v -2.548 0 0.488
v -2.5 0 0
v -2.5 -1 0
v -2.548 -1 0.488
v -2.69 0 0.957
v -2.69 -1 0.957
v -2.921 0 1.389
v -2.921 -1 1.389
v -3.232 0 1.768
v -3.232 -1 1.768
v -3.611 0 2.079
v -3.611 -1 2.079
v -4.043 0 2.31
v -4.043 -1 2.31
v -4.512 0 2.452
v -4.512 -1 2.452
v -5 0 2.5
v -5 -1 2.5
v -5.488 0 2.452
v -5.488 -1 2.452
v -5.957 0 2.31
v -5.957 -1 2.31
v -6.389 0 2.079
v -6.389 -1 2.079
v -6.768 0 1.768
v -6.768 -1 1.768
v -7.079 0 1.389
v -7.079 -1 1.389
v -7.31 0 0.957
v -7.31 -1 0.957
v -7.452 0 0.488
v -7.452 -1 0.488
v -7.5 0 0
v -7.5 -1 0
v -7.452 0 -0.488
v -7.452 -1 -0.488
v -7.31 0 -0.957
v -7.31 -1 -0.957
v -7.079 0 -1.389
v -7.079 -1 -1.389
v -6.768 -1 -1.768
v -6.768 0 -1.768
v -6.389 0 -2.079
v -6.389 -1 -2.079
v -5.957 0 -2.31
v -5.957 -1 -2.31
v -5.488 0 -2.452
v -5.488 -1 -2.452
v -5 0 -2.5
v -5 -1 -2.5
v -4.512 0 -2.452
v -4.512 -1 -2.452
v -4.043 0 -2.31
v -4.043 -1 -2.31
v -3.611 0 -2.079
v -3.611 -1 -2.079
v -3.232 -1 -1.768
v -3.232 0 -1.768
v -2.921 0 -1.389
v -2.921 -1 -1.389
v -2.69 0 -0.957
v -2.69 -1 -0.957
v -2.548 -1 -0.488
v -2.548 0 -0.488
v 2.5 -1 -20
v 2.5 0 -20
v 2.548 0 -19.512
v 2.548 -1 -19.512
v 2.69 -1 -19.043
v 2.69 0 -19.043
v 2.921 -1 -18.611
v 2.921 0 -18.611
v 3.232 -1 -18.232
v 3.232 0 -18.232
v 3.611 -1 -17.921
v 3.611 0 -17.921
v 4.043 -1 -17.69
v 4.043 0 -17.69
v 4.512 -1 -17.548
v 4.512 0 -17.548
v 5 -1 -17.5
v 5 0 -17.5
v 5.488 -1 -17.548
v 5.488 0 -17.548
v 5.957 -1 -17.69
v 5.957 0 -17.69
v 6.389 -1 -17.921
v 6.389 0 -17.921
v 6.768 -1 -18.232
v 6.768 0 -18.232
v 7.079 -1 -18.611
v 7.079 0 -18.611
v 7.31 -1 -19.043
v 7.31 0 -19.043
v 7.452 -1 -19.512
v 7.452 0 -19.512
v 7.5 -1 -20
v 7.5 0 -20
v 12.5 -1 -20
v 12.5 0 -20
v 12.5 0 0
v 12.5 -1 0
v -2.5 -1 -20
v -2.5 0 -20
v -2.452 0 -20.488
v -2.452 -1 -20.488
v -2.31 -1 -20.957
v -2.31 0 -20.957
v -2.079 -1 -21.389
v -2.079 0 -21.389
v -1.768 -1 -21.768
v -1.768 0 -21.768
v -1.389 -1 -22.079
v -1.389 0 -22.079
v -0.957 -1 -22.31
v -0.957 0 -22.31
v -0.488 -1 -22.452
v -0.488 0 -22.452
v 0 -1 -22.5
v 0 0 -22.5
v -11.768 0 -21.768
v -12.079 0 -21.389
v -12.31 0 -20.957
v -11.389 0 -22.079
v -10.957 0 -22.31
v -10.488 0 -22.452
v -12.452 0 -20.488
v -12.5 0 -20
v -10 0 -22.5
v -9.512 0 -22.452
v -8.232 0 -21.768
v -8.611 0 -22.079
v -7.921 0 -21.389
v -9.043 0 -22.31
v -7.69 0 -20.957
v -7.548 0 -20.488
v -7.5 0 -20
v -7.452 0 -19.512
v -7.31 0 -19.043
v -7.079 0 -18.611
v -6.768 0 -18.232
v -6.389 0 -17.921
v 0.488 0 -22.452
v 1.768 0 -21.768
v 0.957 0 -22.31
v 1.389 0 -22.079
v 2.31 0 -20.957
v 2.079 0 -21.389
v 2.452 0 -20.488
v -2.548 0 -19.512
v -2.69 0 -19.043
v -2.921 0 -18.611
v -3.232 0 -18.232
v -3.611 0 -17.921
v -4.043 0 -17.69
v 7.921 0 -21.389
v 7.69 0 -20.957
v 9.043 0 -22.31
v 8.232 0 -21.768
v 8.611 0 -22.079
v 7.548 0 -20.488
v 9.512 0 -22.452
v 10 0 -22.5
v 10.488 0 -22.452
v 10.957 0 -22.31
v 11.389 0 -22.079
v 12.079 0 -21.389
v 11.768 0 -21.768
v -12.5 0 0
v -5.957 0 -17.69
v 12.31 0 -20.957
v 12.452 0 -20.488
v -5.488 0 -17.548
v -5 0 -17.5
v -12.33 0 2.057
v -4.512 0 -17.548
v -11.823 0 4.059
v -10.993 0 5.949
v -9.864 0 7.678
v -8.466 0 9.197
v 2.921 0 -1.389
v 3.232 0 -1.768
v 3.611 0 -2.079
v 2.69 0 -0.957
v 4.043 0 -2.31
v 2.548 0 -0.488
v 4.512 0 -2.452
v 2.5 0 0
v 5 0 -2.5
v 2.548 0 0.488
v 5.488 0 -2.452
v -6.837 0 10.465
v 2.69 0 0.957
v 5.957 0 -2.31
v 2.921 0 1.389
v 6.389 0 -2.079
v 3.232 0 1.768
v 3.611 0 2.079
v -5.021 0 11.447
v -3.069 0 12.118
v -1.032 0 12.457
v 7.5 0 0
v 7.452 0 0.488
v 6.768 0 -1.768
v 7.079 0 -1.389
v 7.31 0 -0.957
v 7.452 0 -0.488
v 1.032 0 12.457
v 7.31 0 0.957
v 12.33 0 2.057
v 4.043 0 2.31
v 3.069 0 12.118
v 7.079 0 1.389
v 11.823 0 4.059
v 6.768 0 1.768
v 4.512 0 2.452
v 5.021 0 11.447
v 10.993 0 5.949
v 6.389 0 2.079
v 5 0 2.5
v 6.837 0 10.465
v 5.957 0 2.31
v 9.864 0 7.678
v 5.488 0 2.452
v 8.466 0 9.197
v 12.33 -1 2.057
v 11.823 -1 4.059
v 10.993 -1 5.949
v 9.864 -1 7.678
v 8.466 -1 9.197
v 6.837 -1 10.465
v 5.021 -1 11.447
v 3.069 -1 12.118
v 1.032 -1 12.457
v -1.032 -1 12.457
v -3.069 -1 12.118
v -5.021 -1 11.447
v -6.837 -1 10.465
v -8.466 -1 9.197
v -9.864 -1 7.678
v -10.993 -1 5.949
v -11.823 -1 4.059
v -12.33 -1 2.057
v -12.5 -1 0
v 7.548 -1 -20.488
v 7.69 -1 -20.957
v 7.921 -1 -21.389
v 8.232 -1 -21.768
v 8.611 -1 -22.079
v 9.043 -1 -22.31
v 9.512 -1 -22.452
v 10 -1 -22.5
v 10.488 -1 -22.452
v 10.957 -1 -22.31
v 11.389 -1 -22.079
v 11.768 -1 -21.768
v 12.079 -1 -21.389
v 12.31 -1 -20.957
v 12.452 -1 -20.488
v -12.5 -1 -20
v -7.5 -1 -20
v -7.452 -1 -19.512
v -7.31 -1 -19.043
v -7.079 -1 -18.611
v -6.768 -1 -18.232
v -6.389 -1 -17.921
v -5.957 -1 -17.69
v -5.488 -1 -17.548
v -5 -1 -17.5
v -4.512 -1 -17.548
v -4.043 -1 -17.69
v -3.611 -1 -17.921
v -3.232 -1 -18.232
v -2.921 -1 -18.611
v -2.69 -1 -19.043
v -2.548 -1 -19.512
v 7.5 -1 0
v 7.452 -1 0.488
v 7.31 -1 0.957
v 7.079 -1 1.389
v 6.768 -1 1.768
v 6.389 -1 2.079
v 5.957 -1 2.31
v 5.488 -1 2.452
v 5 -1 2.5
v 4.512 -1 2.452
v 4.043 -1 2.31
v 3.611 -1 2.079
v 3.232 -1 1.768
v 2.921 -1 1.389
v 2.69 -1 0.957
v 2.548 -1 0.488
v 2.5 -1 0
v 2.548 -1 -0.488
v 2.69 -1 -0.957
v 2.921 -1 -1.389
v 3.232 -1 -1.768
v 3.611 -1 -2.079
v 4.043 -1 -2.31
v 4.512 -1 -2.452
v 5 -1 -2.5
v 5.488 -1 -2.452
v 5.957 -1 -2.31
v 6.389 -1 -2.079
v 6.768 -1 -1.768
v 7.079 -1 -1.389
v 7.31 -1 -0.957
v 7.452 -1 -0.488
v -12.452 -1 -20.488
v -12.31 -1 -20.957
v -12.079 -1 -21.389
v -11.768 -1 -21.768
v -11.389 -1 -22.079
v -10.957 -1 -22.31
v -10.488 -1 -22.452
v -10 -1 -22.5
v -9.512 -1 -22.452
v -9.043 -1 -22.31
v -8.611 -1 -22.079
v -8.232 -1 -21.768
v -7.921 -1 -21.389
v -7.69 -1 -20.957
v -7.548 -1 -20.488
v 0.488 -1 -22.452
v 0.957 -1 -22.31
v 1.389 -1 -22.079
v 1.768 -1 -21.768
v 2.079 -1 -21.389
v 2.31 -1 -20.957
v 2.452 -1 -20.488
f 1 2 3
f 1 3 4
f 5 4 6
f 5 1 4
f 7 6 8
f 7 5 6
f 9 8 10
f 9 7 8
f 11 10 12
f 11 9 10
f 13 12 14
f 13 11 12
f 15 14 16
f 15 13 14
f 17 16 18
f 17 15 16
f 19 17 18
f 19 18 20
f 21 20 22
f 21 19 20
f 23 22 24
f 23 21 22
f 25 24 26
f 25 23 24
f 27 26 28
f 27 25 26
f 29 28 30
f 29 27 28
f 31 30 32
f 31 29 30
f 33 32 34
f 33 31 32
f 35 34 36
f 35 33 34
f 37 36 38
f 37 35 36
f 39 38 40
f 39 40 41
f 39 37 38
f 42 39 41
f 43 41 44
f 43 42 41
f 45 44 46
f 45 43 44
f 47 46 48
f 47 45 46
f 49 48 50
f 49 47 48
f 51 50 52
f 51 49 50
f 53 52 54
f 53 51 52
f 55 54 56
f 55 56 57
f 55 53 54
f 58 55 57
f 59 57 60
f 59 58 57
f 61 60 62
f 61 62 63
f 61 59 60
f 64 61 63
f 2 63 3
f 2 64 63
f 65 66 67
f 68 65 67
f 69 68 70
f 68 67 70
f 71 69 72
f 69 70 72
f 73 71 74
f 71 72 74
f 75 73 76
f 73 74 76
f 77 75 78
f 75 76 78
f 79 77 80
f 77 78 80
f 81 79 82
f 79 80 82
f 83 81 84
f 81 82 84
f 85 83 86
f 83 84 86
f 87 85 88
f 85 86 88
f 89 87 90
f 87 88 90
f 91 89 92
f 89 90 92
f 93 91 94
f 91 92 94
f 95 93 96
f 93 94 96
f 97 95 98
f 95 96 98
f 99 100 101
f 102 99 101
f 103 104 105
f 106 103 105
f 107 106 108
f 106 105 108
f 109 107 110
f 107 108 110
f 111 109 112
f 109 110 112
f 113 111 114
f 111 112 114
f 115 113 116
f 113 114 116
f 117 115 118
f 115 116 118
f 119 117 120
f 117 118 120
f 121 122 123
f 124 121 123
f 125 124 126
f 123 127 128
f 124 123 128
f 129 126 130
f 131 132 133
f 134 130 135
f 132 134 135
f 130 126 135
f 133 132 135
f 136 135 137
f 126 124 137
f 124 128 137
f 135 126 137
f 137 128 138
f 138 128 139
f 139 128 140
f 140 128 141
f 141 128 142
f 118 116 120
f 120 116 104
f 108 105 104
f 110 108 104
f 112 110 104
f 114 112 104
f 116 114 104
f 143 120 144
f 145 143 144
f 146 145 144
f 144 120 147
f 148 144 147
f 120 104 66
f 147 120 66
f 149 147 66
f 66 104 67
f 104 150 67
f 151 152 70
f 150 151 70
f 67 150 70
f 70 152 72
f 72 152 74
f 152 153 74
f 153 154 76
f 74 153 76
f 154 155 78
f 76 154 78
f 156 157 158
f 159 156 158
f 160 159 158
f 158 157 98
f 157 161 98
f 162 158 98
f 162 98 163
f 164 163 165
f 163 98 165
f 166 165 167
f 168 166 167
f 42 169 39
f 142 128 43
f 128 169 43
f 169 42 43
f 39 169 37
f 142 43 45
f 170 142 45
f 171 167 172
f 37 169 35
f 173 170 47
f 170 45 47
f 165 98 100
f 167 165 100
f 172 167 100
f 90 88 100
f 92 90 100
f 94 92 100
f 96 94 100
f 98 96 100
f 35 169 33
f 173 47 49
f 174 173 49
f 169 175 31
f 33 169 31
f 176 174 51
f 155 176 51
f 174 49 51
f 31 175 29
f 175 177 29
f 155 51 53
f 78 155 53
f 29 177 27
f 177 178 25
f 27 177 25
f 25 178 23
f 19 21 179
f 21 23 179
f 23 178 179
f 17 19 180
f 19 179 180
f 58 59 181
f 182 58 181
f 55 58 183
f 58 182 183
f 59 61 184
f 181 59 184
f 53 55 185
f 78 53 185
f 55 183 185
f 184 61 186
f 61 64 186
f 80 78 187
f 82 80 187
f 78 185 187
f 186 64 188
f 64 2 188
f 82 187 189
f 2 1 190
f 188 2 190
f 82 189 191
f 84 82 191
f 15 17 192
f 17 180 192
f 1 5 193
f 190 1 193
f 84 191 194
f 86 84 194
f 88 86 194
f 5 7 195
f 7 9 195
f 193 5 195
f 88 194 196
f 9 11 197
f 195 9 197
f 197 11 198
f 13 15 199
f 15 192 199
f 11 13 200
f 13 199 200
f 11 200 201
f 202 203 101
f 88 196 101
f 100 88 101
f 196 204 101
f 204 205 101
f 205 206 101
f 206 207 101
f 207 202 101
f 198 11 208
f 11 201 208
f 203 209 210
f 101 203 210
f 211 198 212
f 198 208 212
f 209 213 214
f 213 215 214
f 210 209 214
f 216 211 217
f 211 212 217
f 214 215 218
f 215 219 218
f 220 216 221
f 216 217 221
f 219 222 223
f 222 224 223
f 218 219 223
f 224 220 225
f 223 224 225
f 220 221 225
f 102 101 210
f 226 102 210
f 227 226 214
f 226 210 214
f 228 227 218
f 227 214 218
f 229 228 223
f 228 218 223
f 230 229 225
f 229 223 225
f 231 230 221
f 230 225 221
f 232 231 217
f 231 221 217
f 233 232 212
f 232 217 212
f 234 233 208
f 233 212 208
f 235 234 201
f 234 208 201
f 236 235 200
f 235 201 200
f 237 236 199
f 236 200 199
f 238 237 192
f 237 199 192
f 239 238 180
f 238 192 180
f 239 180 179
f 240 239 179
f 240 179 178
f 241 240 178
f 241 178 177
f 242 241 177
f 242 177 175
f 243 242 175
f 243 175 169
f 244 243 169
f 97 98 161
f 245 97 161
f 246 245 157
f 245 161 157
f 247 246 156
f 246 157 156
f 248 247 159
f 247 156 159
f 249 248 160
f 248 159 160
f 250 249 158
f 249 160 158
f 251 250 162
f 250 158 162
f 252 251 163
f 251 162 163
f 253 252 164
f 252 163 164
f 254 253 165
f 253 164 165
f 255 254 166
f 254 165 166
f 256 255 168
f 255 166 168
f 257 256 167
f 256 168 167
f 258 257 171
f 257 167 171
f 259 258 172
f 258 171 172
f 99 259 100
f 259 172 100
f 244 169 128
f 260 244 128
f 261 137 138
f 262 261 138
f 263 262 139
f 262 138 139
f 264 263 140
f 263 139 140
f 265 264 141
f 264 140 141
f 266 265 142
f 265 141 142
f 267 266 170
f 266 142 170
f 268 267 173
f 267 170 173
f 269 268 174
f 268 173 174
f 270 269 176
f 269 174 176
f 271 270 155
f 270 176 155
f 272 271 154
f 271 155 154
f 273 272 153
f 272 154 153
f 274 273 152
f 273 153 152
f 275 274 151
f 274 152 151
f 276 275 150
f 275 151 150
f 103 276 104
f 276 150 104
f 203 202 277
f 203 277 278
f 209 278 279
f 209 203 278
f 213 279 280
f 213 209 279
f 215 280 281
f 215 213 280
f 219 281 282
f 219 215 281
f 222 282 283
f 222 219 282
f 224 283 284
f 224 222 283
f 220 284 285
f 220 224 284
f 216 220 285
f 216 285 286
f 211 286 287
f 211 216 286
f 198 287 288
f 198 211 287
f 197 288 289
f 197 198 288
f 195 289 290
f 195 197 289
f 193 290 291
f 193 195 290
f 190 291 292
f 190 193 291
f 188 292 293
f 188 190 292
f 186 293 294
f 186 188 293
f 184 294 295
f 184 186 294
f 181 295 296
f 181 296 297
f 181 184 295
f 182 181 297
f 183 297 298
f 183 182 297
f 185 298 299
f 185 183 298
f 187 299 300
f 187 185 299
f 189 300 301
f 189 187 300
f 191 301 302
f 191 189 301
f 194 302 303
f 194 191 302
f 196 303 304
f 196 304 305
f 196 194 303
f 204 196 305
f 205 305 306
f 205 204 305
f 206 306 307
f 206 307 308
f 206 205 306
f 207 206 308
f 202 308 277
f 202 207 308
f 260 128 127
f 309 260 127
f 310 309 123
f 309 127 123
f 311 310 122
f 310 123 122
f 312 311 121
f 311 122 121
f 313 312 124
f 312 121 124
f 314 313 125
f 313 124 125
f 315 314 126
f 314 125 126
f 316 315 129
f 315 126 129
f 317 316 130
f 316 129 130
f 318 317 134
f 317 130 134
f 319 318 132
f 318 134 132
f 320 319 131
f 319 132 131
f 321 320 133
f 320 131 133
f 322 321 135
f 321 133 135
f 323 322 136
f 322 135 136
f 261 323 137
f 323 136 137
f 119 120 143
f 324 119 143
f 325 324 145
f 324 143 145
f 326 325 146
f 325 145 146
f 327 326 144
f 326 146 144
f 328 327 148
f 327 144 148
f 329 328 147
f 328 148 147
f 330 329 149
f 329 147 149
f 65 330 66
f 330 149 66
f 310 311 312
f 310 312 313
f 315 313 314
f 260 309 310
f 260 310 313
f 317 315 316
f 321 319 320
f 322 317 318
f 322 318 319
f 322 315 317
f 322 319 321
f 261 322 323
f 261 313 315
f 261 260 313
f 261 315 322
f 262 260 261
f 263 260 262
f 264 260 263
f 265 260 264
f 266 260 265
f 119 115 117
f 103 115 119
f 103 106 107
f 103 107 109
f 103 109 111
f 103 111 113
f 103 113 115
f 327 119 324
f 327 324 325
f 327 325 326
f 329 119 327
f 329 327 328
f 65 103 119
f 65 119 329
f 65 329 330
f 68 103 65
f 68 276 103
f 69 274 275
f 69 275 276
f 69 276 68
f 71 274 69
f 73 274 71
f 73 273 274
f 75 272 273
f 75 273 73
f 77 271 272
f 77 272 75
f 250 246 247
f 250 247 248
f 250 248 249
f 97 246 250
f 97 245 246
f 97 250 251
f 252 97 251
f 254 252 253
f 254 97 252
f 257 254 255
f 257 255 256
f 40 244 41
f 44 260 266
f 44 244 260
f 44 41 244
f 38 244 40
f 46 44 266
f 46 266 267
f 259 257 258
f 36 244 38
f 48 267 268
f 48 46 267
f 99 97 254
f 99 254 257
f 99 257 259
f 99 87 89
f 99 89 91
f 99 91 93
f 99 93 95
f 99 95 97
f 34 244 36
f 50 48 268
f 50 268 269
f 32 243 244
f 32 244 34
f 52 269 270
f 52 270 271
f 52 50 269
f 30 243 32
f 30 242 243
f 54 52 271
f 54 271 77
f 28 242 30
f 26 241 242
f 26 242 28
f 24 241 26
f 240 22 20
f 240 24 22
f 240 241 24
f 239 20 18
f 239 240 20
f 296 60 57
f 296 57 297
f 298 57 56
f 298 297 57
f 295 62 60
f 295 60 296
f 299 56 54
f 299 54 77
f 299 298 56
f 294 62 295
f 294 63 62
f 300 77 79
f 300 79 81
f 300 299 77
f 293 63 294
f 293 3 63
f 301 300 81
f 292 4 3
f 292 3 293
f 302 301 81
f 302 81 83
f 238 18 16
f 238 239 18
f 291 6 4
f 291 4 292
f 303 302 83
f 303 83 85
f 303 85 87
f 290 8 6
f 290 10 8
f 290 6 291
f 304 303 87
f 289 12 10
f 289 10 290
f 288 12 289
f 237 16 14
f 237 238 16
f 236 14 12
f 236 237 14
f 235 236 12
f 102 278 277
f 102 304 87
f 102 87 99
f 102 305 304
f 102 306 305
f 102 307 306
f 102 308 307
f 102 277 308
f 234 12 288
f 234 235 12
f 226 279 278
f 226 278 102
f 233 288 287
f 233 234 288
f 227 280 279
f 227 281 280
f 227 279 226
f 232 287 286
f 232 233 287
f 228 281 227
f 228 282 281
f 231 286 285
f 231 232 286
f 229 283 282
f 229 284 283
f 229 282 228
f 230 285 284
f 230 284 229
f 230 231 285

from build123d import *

# Parameters (mm, degrees)
F0_R     = 2.5
F1_DEPTH = 1


with BuildPart() as f1:
    # F0 (on Front) → F1 (new body)
    with BuildSketch(Plane.XZ):
        with BuildLine():
            ThreePointArc((12.5, 0), (0, 12.5), (-12.5, 0))
            Line((-12.5, 0), (-12.5, -20))
            ThreePointArc((-12.5, -20), (-10, -22.5), (-7.5, -20))
            ThreePointArc((-7.5, -20), (-5, -17.5), (-2.5, -20))
            ThreePointArc((-2.5, -20), (-1.767767, -21.767767), (0, -22.5))
            ThreePointArc((0, -22.5), (1.767767, -21.767767), (2.5, -20))
            ThreePointArc((2.5, -20), (5, -17.5), (7.5, -20))
            ThreePointArc((7.5, -20), (10, -22.5), (12.5, -20))
            Line((12.5, -20), (12.5, 0))
        make_face()
        with Locations((-5, 0)):
            Circle(F0_R, mode=Mode.SUBTRACT)
        with Locations((5, 0)):
            Circle(F0_R, mode=Mode.SUBTRACT)
    extrude(amount=F1_DEPTH)


solid = f1.part
